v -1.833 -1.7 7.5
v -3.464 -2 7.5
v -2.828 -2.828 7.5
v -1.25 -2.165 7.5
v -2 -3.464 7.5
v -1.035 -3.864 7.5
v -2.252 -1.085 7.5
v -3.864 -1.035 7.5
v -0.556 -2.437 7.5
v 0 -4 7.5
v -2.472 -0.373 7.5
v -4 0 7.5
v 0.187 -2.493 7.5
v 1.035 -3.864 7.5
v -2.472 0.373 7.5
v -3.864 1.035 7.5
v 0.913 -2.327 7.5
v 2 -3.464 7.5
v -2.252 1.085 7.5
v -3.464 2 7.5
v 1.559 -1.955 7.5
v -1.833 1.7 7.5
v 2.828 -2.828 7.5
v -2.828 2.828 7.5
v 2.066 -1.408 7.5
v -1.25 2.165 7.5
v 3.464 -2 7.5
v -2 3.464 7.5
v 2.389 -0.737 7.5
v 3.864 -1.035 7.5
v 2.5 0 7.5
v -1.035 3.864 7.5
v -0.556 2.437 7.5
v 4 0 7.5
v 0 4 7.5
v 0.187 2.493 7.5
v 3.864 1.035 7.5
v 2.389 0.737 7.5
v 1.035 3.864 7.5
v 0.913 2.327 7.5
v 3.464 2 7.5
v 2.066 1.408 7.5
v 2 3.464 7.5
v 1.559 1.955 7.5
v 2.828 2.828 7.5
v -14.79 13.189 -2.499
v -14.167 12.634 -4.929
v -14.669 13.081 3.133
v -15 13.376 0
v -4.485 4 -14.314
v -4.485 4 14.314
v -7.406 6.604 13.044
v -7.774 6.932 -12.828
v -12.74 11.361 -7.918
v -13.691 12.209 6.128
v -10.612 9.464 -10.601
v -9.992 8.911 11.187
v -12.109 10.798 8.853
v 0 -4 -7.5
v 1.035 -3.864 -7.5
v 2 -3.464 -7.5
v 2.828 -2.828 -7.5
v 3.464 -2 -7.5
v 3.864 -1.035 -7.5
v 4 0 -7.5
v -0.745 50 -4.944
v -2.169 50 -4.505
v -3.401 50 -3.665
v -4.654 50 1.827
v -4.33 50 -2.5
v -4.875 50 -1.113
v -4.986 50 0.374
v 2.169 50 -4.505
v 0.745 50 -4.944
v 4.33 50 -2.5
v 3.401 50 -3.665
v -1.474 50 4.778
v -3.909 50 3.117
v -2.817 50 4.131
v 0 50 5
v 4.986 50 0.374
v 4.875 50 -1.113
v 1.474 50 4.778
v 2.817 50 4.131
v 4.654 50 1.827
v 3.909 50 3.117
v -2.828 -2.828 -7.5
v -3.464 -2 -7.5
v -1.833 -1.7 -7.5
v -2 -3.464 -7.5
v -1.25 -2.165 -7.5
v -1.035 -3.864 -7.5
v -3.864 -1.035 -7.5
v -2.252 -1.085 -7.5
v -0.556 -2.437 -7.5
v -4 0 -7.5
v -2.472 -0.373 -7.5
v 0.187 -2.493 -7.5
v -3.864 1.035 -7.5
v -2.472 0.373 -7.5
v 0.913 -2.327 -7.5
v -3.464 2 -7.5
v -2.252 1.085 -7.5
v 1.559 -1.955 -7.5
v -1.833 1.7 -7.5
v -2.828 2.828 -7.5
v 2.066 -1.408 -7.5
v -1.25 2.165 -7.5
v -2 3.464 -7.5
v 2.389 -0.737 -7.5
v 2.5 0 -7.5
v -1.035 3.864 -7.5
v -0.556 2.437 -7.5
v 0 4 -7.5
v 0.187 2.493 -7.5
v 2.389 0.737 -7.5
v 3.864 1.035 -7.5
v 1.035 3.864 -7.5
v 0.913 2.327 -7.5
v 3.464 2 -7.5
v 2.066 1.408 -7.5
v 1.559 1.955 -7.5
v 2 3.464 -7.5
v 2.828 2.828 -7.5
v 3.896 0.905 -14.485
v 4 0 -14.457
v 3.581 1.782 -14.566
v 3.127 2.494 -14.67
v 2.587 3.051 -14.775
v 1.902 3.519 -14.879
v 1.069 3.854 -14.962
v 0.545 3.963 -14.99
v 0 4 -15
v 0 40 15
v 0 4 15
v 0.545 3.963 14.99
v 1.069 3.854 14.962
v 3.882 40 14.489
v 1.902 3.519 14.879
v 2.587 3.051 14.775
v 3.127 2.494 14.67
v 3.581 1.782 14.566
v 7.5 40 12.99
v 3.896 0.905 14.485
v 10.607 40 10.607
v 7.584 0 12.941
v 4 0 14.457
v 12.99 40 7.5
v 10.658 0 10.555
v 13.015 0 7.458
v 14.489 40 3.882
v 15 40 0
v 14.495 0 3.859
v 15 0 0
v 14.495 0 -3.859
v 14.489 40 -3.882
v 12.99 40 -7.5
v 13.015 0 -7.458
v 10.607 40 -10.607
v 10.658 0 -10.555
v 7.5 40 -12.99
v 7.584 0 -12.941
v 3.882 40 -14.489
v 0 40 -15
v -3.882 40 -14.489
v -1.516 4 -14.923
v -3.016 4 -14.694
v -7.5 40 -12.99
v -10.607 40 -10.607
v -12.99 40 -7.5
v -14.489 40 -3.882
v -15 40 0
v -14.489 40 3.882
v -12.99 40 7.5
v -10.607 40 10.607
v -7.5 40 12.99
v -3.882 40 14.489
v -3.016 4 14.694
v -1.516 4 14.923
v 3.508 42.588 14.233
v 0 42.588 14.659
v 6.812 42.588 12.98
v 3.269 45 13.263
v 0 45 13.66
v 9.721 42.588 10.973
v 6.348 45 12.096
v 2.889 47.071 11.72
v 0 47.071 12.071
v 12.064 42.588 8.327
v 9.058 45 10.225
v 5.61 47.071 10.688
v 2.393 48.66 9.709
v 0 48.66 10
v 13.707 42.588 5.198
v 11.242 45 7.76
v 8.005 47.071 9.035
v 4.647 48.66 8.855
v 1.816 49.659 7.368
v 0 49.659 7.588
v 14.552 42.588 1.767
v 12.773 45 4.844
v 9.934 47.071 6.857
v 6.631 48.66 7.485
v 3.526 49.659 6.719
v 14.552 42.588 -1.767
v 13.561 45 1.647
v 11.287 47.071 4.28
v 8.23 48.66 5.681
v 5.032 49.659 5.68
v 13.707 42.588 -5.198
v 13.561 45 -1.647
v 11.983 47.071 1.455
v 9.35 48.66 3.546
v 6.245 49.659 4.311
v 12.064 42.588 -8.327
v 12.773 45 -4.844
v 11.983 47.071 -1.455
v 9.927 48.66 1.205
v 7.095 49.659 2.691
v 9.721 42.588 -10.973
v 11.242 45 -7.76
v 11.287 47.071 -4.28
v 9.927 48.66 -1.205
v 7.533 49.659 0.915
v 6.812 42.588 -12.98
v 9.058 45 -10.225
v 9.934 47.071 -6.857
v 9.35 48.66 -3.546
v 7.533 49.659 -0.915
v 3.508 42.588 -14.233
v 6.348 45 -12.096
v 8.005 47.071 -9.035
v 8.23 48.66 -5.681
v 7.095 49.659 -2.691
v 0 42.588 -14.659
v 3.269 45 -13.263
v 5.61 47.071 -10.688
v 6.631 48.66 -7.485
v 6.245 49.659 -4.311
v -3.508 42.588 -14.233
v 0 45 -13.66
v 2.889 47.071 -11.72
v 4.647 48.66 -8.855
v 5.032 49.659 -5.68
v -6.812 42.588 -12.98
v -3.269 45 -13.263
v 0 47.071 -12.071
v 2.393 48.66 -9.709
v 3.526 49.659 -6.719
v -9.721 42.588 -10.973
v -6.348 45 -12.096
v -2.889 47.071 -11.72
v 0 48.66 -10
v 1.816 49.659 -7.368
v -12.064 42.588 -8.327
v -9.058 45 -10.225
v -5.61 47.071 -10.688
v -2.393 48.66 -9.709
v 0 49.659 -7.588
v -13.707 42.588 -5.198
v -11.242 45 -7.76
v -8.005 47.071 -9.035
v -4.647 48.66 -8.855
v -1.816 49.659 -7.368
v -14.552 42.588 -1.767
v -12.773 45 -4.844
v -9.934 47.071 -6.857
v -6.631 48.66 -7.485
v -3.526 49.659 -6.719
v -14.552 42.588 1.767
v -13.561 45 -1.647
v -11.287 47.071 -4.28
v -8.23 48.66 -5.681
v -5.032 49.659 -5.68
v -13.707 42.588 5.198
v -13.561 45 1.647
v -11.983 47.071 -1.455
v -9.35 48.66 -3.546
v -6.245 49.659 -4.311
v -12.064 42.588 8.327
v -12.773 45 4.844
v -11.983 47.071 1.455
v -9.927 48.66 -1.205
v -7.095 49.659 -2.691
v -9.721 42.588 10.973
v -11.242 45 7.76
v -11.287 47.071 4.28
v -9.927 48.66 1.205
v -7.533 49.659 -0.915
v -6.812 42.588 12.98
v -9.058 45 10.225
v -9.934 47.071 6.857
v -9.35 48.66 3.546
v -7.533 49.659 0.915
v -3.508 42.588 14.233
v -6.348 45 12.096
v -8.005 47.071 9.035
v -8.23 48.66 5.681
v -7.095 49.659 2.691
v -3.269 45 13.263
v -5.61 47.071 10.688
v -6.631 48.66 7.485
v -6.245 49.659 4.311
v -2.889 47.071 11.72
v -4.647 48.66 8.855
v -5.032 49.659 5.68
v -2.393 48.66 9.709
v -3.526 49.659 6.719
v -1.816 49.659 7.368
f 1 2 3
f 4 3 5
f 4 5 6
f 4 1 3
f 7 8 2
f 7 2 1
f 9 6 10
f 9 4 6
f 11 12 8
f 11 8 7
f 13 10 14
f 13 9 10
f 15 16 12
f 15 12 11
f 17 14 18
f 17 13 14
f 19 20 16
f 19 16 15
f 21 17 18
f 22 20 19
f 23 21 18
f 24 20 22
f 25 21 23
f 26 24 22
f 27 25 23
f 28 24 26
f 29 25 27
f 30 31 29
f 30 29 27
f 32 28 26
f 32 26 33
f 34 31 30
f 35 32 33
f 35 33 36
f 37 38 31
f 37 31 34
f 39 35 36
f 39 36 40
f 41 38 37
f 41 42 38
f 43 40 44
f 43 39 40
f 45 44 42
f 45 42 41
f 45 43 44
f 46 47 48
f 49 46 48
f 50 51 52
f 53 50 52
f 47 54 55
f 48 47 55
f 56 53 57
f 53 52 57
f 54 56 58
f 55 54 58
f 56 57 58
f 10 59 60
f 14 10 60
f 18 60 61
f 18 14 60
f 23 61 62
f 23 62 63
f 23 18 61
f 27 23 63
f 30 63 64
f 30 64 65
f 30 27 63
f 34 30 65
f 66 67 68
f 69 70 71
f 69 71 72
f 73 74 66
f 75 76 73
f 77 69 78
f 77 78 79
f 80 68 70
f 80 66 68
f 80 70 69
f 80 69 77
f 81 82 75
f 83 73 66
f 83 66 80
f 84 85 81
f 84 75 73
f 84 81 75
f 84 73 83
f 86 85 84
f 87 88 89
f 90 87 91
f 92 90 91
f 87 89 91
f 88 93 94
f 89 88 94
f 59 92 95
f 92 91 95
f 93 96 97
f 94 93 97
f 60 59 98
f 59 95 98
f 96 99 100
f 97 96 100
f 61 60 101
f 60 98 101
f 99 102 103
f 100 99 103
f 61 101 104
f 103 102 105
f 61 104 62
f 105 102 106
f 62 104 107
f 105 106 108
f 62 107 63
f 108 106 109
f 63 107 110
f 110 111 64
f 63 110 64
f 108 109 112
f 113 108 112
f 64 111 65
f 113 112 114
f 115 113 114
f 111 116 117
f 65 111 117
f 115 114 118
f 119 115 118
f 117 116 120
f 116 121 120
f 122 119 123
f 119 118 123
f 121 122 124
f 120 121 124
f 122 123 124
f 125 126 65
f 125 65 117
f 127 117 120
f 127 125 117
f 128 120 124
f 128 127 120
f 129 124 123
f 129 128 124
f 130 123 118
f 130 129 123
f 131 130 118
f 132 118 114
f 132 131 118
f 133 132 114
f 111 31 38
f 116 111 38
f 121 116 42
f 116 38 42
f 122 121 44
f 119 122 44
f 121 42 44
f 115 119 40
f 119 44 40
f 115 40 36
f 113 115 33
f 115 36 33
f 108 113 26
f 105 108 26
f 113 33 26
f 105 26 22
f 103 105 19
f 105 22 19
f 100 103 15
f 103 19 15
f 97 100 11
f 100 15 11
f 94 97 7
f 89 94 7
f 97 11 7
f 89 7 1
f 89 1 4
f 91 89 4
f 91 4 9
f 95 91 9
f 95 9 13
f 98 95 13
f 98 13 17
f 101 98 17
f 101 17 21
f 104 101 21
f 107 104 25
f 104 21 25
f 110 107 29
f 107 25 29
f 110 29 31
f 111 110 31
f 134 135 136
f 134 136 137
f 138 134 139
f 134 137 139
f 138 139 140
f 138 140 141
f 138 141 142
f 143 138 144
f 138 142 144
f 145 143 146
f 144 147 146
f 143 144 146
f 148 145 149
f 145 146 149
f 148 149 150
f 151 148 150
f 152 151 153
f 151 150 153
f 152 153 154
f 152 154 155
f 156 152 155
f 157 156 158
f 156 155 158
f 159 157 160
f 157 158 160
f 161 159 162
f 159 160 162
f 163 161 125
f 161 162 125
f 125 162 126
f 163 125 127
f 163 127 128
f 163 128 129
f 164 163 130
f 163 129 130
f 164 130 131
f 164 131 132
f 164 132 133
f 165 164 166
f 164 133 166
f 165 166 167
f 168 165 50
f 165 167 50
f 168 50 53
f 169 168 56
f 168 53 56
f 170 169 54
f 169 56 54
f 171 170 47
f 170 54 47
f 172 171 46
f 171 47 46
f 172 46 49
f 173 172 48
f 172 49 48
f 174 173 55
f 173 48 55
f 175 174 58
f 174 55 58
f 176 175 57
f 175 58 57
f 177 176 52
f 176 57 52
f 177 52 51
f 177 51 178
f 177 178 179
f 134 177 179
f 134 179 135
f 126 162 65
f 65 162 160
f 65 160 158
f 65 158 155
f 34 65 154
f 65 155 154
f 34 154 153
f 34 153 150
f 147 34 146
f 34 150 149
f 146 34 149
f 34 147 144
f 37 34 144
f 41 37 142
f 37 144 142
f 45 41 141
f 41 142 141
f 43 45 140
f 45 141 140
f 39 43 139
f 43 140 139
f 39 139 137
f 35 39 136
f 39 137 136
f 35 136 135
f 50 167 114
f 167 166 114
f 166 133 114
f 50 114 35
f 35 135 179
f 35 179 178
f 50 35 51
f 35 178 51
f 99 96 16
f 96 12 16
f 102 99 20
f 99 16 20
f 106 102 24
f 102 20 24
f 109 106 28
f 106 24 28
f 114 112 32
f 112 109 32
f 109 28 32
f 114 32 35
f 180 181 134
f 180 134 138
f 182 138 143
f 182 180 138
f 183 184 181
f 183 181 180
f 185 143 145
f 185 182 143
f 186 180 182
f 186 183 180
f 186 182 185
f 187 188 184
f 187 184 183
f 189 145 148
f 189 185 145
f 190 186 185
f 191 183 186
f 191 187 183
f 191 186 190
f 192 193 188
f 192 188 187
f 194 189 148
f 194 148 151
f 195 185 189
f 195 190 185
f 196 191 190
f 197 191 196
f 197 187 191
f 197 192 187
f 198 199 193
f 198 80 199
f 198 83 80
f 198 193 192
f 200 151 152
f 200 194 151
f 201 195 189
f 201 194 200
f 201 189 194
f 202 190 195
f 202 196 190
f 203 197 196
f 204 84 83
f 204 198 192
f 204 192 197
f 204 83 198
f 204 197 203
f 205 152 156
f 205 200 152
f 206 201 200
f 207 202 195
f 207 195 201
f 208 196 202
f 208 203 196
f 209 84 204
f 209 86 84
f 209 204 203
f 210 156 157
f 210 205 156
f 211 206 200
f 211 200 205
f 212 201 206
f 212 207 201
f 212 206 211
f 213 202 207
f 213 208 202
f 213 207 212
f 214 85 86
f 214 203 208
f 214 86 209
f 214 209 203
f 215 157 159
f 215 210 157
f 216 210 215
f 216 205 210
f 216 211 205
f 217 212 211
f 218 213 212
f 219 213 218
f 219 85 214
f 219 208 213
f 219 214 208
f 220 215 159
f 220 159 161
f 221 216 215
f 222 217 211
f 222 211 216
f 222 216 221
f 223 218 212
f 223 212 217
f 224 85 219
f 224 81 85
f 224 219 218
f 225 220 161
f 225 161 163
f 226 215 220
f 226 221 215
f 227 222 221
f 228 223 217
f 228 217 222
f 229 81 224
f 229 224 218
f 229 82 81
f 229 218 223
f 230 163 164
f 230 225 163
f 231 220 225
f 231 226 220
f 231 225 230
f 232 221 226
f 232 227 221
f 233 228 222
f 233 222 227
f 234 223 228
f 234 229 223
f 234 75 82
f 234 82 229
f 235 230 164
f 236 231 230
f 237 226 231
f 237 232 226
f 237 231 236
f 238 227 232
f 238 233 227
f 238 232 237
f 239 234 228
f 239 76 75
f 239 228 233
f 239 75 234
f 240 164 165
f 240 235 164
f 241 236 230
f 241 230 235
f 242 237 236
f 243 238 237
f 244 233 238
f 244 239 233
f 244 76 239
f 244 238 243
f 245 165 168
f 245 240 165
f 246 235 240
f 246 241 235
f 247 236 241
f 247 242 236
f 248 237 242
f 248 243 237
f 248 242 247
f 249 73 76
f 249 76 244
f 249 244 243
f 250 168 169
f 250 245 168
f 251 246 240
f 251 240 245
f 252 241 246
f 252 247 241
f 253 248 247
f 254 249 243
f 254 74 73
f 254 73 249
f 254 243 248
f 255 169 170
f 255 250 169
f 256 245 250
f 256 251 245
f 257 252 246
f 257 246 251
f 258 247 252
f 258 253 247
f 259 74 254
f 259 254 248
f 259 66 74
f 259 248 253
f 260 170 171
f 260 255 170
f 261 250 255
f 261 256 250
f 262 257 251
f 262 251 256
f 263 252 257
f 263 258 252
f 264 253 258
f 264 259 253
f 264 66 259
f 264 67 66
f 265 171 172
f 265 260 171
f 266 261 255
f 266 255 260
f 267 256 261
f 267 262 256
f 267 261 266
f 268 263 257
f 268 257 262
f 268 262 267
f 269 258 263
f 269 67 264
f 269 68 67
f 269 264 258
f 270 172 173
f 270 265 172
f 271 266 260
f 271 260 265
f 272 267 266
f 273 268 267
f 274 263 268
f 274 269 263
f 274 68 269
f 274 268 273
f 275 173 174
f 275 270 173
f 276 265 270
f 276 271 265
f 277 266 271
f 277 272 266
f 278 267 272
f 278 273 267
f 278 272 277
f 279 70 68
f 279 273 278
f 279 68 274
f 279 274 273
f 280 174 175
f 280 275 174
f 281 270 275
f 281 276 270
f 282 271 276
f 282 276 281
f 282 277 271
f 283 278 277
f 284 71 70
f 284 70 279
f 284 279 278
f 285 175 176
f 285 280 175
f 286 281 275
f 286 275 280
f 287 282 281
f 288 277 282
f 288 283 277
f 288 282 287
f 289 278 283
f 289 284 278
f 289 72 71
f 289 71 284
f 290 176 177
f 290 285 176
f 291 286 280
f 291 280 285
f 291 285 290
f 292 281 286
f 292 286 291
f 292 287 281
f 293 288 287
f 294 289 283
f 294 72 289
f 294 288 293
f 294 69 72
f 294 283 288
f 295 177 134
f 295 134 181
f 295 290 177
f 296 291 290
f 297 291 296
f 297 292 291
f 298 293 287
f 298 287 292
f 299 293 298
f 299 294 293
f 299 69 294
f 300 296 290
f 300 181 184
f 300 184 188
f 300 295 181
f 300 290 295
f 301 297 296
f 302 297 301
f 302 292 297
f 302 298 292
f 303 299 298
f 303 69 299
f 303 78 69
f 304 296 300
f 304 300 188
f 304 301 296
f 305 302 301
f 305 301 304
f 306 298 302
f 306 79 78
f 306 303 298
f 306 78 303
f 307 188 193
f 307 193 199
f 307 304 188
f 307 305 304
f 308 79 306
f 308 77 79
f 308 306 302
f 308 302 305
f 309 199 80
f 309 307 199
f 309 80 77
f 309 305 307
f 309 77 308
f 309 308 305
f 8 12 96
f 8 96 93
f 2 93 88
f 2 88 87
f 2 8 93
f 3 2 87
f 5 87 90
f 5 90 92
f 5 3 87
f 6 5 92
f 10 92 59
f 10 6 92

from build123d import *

# Parameters (mm, degrees)
CROQUIS1_R              = 15
SALIENTE_EXTRUIR1_DEPTH = 50
CROQUIS2_R              = 4
SALIENTE_EXTRUIR2_DEPTH = 7.5
CORTAR_EXTRUIR2_START   = 8
CROQUIS3_R              = 4
CORTAR_EXTRUIR2_DEPTH   = 8
REDONDEO1_R             = 10
CORTAR_EXTRUIR3_DEPTH   = 15
CORTAR_EXTRUIR4_DEPTH   = 15
CROQUIS6_R              = 2.5
CORTAR_EXTRUIR5_DEPTH   = 15


with BuildPart() as part:
    # Croquis1 → Saliente-Extruir1 (new body)
    with BuildSketch(Plane(origin=(0, 0, 0), x_dir=(1, 0, 0), z_dir=(0, 1, 0))):
        with Locations(Location((0, 0, 0), (0, 0, 270))):
            Circle(CROQUIS1_R)
    extrude(amount=SALIENTE_EXTRUIR1_DEPTH)

    # Croquis2 → Saliente-Extruir2 (add, symmetric)
    with BuildSketch(Plane.XY):
        Circle(CROQUIS2_R)
    extrude(amount=SALIENTE_EXTRUIR2_DEPTH, both=True)

    # Croquis3 → Cortar-Extruir2 (cut)
    with BuildSketch(Plane.XY.offset(7.5).offset(CORTAR_EXTRUIR2_START)):
        Circle(CROQUIS3_R)
    cortar_extruir2 = extrude(amount=-CORTAR_EXTRUIR2_DEPTH, mode=Mode.SUBTRACT)

    # Simetría1: Cortar-Extruir2 across plane
    add(cortar_extruir2.mirror(Plane.XY), mode=Mode.SUBTRACT)

    # Redondeo1
    redondeo1_edges = [part.edges().sort_by_distance(p)[0] for p in [
        (0, 50, -15),
    ]]
    fillet(redondeo1_edges, radius=REDONDEO1_R)

    # Croquis4 → Cortar-Extruir3 (cut, symmetric)
    with BuildSketch(Plane.XY):
        Polygon((-15, 13.376474032), (-15, 0), (-4, 0), (-4, 3.567059742), align=None)
    extrude(amount=CORTAR_EXTRUIR3_DEPTH, both=True, mode=Mode.SUBTRACT)

    # Croquis5 → Cortar-Extruir4 (cut, symmetric)
    with BuildSketch(Plane.XY):
        with BuildLine():
            Line((0, 4), (-7.90720464, 4))
            Line((-7.90720464, 4), (-7.90720464, -4))
            Line((-7.90720464, -4), (0, -4))
            ThreePointArc((0, -4), (-4, 0), (0, 4))
        make_face()
    extrude(amount=CORTAR_EXTRUIR4_DEPTH, both=True, mode=Mode.SUBTRACT)

    # Croquis6 → Cortar-Extruir5 (cut)
    with BuildSketch(Plane.XY.offset(7.5)):
        Circle(CROQUIS6_R)
    extrude(amount=-CORTAR_EXTRUIR5_DEPTH, mode=Mode.SUBTRACT)


solid = part.part
